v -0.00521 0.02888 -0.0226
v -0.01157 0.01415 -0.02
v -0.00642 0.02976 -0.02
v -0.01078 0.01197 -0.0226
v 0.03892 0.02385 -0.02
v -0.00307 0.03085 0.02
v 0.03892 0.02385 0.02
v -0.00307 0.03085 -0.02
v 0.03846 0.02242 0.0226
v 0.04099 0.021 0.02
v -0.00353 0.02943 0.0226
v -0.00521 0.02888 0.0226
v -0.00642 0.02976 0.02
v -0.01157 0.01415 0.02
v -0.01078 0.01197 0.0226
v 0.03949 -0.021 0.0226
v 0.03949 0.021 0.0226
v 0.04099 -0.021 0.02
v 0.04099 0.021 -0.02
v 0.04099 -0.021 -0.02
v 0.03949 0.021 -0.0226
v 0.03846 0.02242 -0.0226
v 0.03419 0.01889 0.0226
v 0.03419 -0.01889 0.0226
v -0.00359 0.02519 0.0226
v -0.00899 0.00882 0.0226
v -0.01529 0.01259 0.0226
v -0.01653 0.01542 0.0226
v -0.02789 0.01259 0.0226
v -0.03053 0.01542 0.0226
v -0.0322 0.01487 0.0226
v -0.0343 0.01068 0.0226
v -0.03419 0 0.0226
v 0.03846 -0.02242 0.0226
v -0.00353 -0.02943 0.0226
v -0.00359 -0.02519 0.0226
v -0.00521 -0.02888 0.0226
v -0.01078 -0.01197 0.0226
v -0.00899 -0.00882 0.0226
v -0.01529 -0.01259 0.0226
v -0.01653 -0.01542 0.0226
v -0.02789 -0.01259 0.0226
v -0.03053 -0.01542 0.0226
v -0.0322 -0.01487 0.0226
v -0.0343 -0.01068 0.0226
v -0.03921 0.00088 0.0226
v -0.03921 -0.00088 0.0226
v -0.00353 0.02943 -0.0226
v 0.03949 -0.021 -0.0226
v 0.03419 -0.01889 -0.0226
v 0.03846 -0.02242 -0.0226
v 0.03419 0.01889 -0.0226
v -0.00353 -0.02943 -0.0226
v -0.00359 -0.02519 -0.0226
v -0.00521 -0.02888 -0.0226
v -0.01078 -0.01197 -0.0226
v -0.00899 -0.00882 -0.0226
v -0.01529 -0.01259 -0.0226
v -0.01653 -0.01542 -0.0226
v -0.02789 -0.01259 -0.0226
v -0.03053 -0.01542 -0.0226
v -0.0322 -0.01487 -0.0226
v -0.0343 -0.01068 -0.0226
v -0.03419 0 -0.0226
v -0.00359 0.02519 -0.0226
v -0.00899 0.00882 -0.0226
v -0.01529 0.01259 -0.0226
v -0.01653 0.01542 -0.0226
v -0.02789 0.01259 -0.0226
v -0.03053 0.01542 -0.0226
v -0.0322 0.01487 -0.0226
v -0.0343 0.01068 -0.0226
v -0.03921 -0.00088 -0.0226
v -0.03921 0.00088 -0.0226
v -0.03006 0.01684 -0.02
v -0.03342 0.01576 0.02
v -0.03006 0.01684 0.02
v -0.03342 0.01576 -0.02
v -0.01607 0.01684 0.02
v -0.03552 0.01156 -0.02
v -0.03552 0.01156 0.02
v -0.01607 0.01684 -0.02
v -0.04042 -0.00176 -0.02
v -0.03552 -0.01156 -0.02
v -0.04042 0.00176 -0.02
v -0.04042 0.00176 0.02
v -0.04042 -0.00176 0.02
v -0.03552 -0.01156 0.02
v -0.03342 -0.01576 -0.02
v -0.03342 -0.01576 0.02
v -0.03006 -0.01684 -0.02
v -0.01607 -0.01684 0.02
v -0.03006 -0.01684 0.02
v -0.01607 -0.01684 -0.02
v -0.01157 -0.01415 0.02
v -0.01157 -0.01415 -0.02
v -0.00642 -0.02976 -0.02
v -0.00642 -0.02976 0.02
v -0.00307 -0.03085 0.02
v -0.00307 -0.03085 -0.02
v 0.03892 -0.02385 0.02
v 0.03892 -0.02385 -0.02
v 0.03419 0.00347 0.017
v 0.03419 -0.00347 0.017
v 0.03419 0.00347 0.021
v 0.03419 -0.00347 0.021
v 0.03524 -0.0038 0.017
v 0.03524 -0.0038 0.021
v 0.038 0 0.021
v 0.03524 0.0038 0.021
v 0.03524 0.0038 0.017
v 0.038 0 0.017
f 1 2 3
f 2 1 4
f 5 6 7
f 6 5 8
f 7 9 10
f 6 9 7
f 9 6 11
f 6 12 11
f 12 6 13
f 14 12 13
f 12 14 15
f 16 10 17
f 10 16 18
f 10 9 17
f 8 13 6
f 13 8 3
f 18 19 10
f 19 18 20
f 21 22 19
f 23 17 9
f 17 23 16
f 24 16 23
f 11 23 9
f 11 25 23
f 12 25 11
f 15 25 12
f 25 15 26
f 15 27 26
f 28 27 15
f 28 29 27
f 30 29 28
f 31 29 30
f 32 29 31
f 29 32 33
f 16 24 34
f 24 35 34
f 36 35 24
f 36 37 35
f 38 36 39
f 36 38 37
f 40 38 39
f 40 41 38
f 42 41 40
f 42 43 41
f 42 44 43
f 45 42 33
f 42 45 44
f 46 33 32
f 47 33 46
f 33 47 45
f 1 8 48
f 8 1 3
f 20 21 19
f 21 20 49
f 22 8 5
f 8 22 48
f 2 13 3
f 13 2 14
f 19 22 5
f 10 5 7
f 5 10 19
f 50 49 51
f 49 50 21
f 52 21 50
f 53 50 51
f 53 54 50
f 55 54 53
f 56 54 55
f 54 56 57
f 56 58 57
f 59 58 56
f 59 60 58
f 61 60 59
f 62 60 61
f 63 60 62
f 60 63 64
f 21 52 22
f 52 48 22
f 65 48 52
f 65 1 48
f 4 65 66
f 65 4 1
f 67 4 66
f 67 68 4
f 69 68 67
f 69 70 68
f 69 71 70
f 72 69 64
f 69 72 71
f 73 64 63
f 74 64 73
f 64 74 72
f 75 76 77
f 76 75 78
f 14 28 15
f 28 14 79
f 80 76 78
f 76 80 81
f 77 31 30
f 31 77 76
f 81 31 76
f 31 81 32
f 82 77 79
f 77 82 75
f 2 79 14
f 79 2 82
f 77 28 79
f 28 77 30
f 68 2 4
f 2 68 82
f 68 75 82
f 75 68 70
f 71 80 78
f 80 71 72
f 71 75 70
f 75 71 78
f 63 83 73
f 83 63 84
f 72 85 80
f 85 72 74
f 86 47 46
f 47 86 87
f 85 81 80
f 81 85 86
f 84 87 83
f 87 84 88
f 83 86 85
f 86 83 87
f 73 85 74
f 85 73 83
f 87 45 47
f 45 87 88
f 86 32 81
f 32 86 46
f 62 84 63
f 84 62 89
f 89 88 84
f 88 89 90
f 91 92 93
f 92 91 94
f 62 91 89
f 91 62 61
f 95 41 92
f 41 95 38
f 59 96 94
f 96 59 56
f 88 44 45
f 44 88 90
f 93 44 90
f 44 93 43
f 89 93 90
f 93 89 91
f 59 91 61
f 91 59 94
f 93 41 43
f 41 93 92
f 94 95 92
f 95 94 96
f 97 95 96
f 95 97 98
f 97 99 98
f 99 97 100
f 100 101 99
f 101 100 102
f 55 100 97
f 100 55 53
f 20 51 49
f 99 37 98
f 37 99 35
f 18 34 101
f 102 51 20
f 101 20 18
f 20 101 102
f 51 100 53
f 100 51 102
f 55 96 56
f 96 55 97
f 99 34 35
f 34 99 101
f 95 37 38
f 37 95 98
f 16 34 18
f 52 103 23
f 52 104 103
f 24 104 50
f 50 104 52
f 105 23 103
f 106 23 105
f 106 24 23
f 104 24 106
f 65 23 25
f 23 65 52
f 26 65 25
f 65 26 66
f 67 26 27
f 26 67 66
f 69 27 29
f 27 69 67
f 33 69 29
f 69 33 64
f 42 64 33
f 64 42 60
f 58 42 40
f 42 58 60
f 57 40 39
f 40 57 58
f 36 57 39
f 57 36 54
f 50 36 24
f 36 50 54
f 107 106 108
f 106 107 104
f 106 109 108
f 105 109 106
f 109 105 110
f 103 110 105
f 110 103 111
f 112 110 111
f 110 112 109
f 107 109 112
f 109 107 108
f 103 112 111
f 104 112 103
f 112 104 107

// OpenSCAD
// Parameters
bbox_x = 0.08; //[0.04:0.16:0.001]
bbox_y = 0.06; //[0.03:0.12:0.001]
thickness_z = 0.04; //[0.02:0.08:0.001]
hole_hex_flat_to_flat = 0.018; //[0.009:0.036:0.001]
hole_center_x = 0.018; //[0.008:0.04:0.001]
hole_center_y = 0.03; //[0.015:0.045:0.001]
neck_min_width_y = 0.028; //[0.014:0.056:0.001]
small_lobe_len_x = 0.028; //[0.014:0.056:0.001]
large_lobe_len_x = 0.052; //[0.026:0.104:0.001]
large_lobe_max_width_y = 0.06; //[0.03:0.12:0.001]
outline_margin_x = 0.002; //[0.001:0.01:0.001]
outline_margin_y = 0.002; //[0.001:0.01:0.001]
edge_chamfer_z = 0.004; //[0.001:0.01:0.001]
edge_chamfer_overlap = 0.001; //[0.0005:0.002:0.0005]
corner_fillet_r_approx = 0.003; //[0.001:0.008:0.001]
engrave_depth = 0.002; //[0.001:0.006:0.001]
engrave_radius = 0.004; //[0.002:0.01:0.001]

// Base Shapes
module two_lobe_profile_with_neck_transition() {
  linear_extrude(height=thickness_z, center=true) {
    polygon(points=[
      [-bbox_x/2 + outline_margin_x, 0],
      [-bbox_x/2 + outline_margin_x + small_lobe_len_x*0.25, neck_min_width_y*0.50],
      [-bbox_x/2 + outline_margin_x + small_lobe_len_x*0.75, neck_min_width_y*0.50],
      [-bbox_x/2 + outline_margin_x + small_lobe_len_x, neck_min_width_y*0.35],
      [-bbox_x/2 + outline_margin_x + small_lobe_len_x + (large_lobe_len_x - small_lobe_len_x)*0.25, large_lobe_max_width_y/2 - outline_margin_y],
      [bbox_x/2 - outline_margin_x, large_lobe_max_width_y*0.35],
      [bbox_x/2 - outline_margin_x, -large_lobe_max_width_y*0.35],
      [-bbox_x/2 + outline_margin_x + small_lobe_len_x + (large_lobe_len_x - small_lobe_len_x)*0.25, -large_lobe_max_width_y/2 + outline_margin_y],
      [-bbox_x/2 + outline_margin_x + small_lobe_len_x, -neck_min_width_y*0.35],
      [-bbox_x/2 + outline_margin_x + small_lobe_len_x*0.75, -neck_min_width_y*0.50],
      [-bbox_x/2 + outline_margin_x + small_lobe_len_x*0.25, -neck_min_width_y*0.50]
    ]);
  }
}

module hex_through_hole() {
  translate([-bbox_x/2 + hole_center_x, -bbox_y/2 + hole_center_y, 0])
  linear_extrude(height=thickness_z + 2*edge_chamfer_overlap, center=true) {
    polygon(points=[
      [hole_hex_flat_to_flat/2, 0],
      [hole_hex_flat_to_flat/4, hole_hex_flat_to_flat*0.4330127019],
      [-hole_hex_flat_to_flat/4, hole_hex_flat_to_flat*0.4330127019],
      [-hole_hex_flat_to_flat/2, 0],
      [-hole_hex_flat_to_flat/4, -hole_hex_flat_to_flat*0.4330127019],
      [hole_hex_flat_to_flat/4, -hole_hex_flat_to_flat*0.4330127019]
    ]);
  }
}

module small_edge_chamfer_in_Z_top_cut() {
  translate([0, 0, thickness_z/2 - edge_chamfer_z/2])
  linear_extrude(height=thickness_z, center=true) {
    polygon(points=[
      [(-bbox_x/2 + outline_margin_x) * (1 - edge_chamfer_z/thickness_z), 0],
      [(-bbox_x/2 + outline_margin_x + small_lobe_len_x*0.25) * (1 - edge_chamfer_z/thickness_z), (neck_min_width_y*0.50) * (1 - edge_chamfer_z/thickness_z)],
      [(-bbox_x/2 + outline_margin_x + small_lobe_len_x*0.75) * (1 - edge_chamfer_z/thickness_z), (neck_min_width_y*0.50) * (1 - edge_chamfer_z/thickness_z)],
      [(-bbox_x/2 + outline_margin_x + small_lobe_len_x) * (1 - edge_chamfer_z/thickness_z), (neck_min_width_y*0.35) * (1 - edge_chamfer_z/thickness_z)],
      [(-bbox_x/2 + outline_margin_x + small_lobe_len_x + (large_lobe_len_x - small_lobe_len_x)*0.25) * (1 - edge_chamfer_z/thickness_z), (large_lobe_max_width_y/2 - outline_margin_y) * (1 - edge_chamfer_z/thickness_z)],
      [(bbox_x/2 - outline_margin_x) * (1 - edge_chamfer_z/thickness_z), (large_lobe_max_width_y*0.35) * (1 - edge_chamfer_z/thickness_z)],
      [(bbox_x/2 - outline_margin_x) * (1 - edge_chamfer_z/thickness_z), (-large_lobe_max_width_y*0.35) * (1 - edge_chamfer_z/thickness_z)],
      [(-bbox_x/2 + outline_margin_x + small_lobe_len_x + (large_lobe_len_x - small_lobe_len_x)*0.25) * (1 - edge_chamfer_z/thickness_z), (-large_lobe_max_width_y/2 + outline_margin_y) * (1 - edge_chamfer_z/thickness_z)],
      [(-bbox_x/2 + outline_margin_x + small_lobe_len_x) * (1 - edge_chamfer_z/thickness_z), (-neck_min_width_y*0.35) * (1 - edge_chamfer_z/thickness_z)],
      [(-bbox_x/2 + outline_margin_x + small_lobe_len_x*0.75) * (1 - edge_chamfer_z/thickness_z), (-neck_min_width_y*0.50) * (1 - edge_chamfer_z/thickness_z)],
      [(-bbox_x/2 + outline_margin_x + small_lobe_len_x*0.25) * (1 - edge_chamfer_z/thickness_z), (-neck_min_width_y*0.50) * (1 - edge_chamfer_z/thickness_z)]
    ]);
  }
}

module small_edge_chamfer_in_Z_bottom_cut() {
  translate([0, 0, -thickness_z/2 + edge_chamfer_z/2])
  linear_extrude(height=thickness_z, center=true) {
    polygon(points=[
      [(-bbox_x/2 + outline_margin_x) * (1 - edge_chamfer_z/thickness_z), 0],
      [(-bbox_x/2 + outline_margin_x + small_lobe_len_x*0.25) * (1 - edge_chamfer_z/thickness_z), (neck_min_width_y*0.50) * (1 - edge_chamfer_z/thickness_z)],
      [(-bbox_x/2 + outline_margin_x + small_lobe_len_x*0.75) * (1 - edge_chamfer_z/thickness_z), (neck_min_width_y*0.50) * (1 - edge_chamfer_z/thickness_z)],
      [(-bbox_x/2 + outline_margin_x + small_lobe_len_x) * (1 - edge_chamfer_z/thickness_z), (neck_min_width_y*0.35) * (1 - edge_chamfer_z/thickness_z)],
      [(-bbox_x/2 + outline_margin_x + small_lobe_len_x + (large_lobe_len_x - small_lobe_len_x)*0.25) * (1 - edge_chamfer_z/thickness_z), (large_lobe_max_width_y/2 - outline_margin_y) * (1 - edge_chamfer_z/thickness_z)],
      [(bbox_x/2 - outline_margin_x) * (1 - edge_chamfer_z/thickness_z), (large_lobe_max_width_y*0.35) * (1 - edge_chamfer_z/thickness_z)],
      [(bbox_x/2 - outline_margin_x) * (1 - edge_chamfer_z/thickness_z), (-large_lobe_max_width_y*0.35) * (1 - edge_chamfer_z/thickness_z)],
      [(-bbox_x/2 + outline_margin_x + small_lobe_len_x + (large_lobe_len_x - small_lobe_len_x)*0.25) * (1 - edge_chamfer_z/thickness_z), (-large_lobe_max_width_y/2 + outline_margin_y) * (1 - edge_chamfer_z/thickness_z)],
      [(-bbox_x/2 + outline_margin_x + small_lobe_len_x) * (1 - edge_chamfer_z/thickness_z), (-neck_min_width_y*0.35) * (1 - edge_chamfer_z/thickness_z)],
      [(-bbox_x/2 + outline_margin_x + small_lobe_len_x*0.75) * (1 - edge_chamfer_z/thickness_z), (-neck_min_width_y*0.50) * (1 - edge_chamfer_z/thickness_z)],
      [(-bbox_x/2 + outline_margin_x + small_lobe_len_x*0.25) * (1 - edge_chamfer_z/thickness_z), (-neck_min_width_y*0.50) * (1 - edge_chamfer_z/thickness_z)]
    ]);
  }
}

module corner_fillet_approximation_sphere() {
  translate([0, 0, 0])
  sphere(r=corner_fillet_r_approx, center=true);
}

module engraving_or_marking() {
  translate([bbox_x/2 - outline_margin_x - engrave_radius, 0, thickness_z/2 - engrave_depth/2])
  cylinder(r=engrave_radius, h=engrave_depth + 2*edge_chamfer_overlap, center=true);
}

// Operations
module angled_perimeter_segments() {
  minkowski() {
    two_lobe_profile_with_neck_transition();
    corner_fillet_approximation_sphere();
  }
}

module plate_body_irregular_outline() {
  difference() {
    angled_perimeter_segments();
    hex_through_hole();
  }
}

module plate_with_small_edge_chamfer_in_Z() {
  difference() {
    plate_body_irregular_outline();
    small_edge_chamfer_in_Z_top_cut();
    small_edge_chamfer_in_Z_bottom_cut();
  }
}

module final_bracket_no_text_marking() {
  difference() {
    plate_with_small_edge_chamfer_in_Z();
    engraving_or_marking();
  }
}

// Final Output
final_bracket_no_text_marking();
